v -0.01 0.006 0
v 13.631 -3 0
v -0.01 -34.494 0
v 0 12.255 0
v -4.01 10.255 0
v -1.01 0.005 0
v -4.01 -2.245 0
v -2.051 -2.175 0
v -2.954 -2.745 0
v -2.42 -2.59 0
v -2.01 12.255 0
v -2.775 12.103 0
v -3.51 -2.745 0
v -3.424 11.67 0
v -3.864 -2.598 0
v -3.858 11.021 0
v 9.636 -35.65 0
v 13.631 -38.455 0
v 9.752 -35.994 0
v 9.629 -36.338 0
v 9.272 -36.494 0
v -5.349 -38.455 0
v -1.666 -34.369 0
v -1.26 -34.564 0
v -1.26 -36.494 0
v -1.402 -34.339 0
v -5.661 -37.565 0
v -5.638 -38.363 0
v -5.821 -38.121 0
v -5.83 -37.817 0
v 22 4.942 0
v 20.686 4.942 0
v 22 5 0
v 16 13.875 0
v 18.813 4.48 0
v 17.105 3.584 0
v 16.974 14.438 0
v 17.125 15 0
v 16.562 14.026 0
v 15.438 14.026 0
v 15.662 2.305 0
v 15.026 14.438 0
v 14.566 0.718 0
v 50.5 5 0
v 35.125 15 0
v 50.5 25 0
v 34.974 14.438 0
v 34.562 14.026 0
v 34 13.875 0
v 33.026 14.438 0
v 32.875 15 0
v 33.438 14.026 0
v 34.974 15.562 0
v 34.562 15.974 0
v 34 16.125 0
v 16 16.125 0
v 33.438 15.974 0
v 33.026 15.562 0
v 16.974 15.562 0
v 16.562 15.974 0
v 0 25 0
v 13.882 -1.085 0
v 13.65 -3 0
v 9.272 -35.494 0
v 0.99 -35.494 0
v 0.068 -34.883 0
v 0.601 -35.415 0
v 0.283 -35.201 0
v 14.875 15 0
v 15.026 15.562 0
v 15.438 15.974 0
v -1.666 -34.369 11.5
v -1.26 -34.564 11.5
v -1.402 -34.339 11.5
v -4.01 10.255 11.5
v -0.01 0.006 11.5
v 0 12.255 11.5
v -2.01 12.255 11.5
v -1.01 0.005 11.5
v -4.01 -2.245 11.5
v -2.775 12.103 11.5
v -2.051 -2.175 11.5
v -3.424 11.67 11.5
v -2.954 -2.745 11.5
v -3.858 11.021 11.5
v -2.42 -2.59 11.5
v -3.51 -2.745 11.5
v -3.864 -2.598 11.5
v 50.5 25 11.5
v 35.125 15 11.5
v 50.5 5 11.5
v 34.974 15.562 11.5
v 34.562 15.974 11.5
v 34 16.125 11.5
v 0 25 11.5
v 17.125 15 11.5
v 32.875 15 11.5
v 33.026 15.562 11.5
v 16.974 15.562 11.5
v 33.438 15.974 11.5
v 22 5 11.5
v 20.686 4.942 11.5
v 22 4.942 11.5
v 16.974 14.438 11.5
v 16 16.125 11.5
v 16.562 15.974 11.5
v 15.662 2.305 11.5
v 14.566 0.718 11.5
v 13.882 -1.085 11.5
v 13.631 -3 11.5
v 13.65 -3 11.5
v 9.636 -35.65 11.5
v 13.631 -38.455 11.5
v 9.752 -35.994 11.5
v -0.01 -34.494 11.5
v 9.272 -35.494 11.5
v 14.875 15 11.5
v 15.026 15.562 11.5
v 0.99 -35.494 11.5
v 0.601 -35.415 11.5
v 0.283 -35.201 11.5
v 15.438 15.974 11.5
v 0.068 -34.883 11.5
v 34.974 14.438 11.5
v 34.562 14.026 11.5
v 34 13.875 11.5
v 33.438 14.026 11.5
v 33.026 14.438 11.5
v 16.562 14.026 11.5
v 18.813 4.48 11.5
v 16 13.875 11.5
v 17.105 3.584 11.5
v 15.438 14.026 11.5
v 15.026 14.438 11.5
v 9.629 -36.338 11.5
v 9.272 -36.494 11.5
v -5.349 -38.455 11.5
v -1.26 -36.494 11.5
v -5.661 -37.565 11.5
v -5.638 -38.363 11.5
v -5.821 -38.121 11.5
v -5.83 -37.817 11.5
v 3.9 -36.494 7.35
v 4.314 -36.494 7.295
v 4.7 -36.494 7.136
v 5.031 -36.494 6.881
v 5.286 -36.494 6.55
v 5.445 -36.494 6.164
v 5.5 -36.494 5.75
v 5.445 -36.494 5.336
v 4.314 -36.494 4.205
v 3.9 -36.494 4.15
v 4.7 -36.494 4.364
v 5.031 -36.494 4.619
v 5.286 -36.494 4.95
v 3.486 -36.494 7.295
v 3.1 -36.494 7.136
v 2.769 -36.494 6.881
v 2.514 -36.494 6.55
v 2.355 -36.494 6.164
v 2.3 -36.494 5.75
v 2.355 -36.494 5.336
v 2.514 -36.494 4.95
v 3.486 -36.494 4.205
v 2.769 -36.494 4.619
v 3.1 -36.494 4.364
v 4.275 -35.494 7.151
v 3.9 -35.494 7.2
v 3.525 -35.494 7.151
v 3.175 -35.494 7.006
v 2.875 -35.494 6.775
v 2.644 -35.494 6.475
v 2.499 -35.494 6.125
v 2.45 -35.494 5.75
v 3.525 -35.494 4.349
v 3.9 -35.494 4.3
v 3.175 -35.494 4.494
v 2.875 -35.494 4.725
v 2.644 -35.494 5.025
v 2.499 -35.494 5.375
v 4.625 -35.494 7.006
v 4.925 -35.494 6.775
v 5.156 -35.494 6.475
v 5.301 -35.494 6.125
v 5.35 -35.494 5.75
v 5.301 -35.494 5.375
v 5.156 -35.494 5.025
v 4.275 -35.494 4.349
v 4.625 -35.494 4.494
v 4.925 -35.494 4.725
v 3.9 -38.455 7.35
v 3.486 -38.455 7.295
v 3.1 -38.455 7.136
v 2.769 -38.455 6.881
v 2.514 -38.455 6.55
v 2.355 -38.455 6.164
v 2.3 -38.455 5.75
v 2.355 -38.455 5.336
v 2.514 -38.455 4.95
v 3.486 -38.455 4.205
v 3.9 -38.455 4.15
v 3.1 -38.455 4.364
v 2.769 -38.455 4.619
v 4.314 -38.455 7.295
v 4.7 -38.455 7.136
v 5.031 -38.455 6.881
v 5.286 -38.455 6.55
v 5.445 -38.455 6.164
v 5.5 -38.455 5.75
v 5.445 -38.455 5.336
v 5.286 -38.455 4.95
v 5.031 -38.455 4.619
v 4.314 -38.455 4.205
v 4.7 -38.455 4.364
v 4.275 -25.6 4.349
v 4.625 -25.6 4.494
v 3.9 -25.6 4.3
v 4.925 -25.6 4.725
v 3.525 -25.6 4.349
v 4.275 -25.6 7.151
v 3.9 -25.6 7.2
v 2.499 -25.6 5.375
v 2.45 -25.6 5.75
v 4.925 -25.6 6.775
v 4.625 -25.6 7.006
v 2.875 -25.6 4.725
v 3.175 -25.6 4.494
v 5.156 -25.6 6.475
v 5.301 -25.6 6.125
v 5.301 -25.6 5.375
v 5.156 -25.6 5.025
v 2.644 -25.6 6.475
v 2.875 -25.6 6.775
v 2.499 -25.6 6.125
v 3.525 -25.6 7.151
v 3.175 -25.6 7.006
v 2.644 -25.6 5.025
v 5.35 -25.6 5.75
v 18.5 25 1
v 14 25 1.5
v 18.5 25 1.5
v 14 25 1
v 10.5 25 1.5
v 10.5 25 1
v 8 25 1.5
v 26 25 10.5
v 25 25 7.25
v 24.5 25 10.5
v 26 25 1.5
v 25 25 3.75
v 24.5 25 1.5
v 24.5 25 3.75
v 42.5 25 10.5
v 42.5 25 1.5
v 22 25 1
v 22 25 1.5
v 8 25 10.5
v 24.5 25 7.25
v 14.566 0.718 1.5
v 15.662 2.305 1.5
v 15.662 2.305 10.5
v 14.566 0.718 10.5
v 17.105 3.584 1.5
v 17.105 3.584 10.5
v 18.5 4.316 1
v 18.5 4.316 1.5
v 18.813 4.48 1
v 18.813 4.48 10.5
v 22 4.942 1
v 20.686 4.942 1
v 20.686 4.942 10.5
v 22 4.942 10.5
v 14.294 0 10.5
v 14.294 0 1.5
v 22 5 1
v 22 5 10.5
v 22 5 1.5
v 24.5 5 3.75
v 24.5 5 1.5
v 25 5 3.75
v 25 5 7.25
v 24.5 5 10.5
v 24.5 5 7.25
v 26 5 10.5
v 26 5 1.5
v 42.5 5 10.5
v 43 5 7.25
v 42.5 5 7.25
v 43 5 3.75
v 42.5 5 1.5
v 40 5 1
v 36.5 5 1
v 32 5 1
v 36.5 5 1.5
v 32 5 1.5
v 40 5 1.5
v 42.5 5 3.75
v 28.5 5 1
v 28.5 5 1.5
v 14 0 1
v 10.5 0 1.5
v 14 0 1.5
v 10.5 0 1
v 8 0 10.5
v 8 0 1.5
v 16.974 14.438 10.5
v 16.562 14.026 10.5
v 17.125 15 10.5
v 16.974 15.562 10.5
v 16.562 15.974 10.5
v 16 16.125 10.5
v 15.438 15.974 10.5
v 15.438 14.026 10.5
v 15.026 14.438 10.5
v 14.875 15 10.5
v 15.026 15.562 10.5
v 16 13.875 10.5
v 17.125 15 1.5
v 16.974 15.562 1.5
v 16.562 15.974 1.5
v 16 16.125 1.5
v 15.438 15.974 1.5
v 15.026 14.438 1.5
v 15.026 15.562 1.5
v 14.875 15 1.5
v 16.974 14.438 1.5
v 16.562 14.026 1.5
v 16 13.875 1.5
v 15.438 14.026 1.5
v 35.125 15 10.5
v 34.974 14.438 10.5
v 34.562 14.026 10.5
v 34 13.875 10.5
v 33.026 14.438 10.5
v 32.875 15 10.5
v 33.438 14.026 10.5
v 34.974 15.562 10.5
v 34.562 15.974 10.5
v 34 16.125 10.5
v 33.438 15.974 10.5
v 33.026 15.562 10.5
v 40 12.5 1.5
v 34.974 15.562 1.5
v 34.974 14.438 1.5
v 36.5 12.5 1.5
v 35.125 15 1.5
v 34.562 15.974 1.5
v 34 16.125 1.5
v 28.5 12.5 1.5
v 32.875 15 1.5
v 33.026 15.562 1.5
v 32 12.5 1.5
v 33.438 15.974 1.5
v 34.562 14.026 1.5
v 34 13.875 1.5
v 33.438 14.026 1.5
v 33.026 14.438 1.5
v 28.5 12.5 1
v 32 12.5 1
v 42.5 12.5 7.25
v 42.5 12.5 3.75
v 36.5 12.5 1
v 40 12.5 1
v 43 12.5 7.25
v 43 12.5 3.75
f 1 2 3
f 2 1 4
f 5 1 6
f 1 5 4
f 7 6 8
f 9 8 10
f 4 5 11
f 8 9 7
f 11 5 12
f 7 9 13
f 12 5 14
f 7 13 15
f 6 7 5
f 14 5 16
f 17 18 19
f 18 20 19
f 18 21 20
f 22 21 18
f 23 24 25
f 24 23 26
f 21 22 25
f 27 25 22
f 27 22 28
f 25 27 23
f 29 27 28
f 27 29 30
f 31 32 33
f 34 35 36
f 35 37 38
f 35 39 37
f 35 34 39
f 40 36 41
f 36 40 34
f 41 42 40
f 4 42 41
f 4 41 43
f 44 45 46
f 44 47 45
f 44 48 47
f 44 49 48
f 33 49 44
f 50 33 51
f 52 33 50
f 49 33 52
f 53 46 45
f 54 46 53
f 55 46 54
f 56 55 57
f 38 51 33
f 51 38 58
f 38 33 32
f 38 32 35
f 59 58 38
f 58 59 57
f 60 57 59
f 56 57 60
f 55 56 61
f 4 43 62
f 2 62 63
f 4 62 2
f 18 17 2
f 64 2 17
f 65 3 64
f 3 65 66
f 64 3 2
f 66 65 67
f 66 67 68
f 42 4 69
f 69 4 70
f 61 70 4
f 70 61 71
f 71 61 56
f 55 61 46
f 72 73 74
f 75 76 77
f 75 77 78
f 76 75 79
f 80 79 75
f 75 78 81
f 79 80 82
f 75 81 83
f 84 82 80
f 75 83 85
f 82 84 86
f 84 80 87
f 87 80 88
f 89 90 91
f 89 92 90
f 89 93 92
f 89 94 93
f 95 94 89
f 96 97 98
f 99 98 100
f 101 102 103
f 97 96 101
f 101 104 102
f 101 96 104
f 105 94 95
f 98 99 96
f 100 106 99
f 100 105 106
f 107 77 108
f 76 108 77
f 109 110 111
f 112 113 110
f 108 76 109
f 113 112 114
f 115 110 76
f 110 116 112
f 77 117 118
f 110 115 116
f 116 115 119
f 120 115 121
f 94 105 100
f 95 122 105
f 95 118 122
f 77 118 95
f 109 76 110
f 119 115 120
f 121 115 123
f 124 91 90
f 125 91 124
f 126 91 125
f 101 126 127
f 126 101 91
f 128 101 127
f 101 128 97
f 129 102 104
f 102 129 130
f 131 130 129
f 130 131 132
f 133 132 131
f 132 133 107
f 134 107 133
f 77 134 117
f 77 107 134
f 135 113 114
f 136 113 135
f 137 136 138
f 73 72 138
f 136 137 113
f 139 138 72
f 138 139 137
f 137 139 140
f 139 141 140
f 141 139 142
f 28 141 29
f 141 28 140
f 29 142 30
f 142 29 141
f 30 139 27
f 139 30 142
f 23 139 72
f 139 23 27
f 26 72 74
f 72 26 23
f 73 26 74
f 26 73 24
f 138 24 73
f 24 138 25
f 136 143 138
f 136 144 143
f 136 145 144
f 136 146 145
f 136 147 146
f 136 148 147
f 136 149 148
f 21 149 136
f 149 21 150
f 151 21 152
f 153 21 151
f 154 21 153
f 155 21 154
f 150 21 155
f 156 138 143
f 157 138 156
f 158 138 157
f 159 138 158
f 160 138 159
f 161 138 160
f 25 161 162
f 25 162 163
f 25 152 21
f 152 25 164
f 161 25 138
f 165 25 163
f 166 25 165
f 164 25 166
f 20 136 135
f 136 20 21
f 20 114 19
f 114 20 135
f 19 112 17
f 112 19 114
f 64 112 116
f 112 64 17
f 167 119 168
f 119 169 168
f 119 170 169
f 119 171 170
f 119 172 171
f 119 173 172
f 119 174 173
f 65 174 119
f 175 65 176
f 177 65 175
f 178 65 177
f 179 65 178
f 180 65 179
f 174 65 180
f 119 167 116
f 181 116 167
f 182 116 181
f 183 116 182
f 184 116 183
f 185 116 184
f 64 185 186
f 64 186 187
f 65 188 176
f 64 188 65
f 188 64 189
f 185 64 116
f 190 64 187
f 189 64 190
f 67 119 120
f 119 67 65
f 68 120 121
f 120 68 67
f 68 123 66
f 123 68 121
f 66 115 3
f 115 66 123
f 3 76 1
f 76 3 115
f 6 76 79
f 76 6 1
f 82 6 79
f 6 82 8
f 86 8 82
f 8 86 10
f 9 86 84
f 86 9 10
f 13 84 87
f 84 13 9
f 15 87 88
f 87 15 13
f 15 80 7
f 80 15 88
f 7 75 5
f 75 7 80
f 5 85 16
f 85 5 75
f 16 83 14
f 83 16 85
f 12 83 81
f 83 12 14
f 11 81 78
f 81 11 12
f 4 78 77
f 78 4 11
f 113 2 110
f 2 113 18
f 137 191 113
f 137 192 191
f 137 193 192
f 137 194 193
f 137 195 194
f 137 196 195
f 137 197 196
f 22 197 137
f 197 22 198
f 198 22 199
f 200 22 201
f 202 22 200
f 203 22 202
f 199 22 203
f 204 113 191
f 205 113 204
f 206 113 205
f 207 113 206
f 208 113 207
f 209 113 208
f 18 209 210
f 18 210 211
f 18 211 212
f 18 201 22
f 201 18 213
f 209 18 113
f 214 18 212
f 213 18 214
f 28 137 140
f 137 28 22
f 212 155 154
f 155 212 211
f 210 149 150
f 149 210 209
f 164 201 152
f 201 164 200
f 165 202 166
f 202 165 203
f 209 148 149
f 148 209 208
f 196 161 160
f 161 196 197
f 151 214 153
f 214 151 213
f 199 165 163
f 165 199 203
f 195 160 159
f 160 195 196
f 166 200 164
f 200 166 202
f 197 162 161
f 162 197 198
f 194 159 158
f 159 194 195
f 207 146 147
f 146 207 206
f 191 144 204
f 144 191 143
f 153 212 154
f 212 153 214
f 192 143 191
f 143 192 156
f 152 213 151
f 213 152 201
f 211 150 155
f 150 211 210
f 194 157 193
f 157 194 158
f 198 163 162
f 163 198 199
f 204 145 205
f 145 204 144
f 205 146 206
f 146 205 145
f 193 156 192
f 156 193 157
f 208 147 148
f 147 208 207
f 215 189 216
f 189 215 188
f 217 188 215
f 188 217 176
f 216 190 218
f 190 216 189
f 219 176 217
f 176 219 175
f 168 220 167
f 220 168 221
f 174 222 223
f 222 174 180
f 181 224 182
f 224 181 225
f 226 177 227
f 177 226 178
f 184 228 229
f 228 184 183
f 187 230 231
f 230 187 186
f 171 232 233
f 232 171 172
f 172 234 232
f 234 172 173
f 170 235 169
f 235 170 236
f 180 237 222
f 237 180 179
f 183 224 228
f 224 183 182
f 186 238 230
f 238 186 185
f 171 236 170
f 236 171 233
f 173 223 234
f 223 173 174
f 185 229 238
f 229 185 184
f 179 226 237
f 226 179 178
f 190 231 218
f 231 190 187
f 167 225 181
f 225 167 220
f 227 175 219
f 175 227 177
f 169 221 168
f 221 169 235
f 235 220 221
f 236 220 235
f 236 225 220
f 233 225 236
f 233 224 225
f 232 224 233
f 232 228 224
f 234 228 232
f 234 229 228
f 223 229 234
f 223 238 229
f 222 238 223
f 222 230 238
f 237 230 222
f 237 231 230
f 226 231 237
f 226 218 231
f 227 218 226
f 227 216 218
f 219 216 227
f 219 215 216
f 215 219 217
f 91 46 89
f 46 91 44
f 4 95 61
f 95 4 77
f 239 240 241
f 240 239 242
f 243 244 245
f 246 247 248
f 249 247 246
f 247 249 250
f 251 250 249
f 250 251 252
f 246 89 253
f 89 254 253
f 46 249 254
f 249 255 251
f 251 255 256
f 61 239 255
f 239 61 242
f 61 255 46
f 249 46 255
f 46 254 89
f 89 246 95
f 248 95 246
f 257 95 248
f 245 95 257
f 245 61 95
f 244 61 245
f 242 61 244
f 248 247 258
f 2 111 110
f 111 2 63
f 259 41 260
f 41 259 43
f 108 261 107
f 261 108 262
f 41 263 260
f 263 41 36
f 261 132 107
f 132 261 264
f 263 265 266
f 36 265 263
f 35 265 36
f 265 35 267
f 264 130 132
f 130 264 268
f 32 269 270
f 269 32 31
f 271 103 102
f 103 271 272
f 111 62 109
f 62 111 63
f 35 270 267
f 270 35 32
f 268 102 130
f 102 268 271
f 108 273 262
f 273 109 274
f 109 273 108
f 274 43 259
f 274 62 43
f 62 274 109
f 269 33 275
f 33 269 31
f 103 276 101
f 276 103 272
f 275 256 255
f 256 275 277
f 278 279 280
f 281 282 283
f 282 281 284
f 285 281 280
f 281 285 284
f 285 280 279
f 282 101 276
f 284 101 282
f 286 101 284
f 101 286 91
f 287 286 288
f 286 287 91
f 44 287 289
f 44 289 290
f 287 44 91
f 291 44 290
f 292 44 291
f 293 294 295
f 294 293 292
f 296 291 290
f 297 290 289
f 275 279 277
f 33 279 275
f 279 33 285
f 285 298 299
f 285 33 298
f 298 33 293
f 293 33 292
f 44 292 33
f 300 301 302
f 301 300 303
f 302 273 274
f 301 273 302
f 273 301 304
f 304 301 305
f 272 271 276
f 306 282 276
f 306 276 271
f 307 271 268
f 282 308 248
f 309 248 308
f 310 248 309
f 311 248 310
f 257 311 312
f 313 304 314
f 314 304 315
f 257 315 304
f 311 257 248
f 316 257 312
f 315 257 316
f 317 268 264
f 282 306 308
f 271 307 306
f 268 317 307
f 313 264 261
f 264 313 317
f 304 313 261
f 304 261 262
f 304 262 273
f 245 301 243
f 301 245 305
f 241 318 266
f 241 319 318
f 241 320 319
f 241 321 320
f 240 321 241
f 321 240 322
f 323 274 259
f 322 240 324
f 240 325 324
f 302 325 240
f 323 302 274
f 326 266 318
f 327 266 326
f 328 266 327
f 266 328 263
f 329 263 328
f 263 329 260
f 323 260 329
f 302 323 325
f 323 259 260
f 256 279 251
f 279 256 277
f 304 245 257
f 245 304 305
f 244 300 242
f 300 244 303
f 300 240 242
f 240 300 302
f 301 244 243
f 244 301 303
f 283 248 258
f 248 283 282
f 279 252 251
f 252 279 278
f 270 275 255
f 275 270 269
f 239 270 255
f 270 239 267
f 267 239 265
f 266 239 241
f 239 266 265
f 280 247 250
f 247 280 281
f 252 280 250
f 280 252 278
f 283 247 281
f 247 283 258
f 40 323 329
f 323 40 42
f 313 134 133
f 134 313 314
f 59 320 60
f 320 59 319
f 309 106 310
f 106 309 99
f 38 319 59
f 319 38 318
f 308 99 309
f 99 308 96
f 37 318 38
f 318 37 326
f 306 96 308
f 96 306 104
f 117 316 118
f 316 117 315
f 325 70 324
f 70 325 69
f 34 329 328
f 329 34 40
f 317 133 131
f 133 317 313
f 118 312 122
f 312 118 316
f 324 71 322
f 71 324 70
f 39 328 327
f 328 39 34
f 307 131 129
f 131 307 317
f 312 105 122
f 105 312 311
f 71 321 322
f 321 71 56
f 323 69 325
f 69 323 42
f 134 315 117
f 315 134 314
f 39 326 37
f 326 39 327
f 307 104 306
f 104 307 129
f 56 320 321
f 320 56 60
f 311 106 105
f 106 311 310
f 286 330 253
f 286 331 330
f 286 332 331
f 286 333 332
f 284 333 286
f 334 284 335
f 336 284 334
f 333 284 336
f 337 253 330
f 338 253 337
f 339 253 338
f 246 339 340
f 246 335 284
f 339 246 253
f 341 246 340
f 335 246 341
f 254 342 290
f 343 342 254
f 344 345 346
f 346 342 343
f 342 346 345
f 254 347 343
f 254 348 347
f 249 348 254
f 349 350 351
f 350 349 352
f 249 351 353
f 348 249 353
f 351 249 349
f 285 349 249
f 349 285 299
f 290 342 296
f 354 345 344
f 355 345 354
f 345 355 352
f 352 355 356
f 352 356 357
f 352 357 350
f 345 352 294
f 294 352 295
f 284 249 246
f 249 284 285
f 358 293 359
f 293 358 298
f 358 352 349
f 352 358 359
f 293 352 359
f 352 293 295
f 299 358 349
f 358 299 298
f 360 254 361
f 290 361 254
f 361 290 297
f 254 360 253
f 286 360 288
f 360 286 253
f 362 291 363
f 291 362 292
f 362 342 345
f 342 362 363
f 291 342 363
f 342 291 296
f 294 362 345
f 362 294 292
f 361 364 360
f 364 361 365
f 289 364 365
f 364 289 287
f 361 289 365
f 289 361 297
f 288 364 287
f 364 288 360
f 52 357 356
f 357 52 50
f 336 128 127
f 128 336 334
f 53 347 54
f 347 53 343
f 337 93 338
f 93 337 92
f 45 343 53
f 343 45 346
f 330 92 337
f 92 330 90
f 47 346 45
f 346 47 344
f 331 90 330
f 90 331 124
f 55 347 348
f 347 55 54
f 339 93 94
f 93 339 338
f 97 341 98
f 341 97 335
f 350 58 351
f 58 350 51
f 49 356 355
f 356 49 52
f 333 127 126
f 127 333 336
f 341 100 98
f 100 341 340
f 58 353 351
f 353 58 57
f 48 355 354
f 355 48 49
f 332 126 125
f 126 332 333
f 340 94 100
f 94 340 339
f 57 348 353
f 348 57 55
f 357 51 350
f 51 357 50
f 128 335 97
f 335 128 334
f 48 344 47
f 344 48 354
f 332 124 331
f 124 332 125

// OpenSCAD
// This work is licensed under a Creative Commons Attribution-ShareAlike 3.0 Unported License.
// https://creativecommons.org/licenses/by-sa/3.0/

// DIN rail clamp thickness: at least 11 to have enough space for the PowerPoles; if thicker, provides a good place for labels
clampThickness = 11.5;
// the top of the row of PowerPoles will be this far above the DIN rail
heightAboveRail = 25;
// provides a good place for a label
spacingOutwardsFromRail = 8;
// how many pairs of PowerPoles?
pairCount = 2;
// spacing between PowerPole pairs
pairSpacing = 1.5;
// an endcap is a good place for a label
endcapWidth = 8;
// width of a single PowerPole; should be 8mm, but probably larger to compensate for your printer
powerPoleSquareSide = 8.5;
// diameter of roll pins to hold the PowerPoles in place; compensate for your printer
rollPinDiameter = 2.25;
// how deep the bolt should go into the solid part, past the spring clip
boltHoleDepth = 10;
// diameter where the bolt passes through the spring clip
looseBoltDiameter = 3.2;
// diameter where the bolt should screw into the DIN holder body
tightBoltDiameter = 2.9;

// DIN rail clamp
// adapted from Thingiverse 101024 by Robert Hunt
// made with 1mm wider opening: my rail is bigger or my printer prints too small
// Dimensions: 19.74 x 51 x clampThickness
module din_clamp() {
	$fn = 24;
	translate([10.1, -13.1, 0])
	difference() {
		linear_extrude(height=clampThickness, convexity=5) {
			// imported Robert's DXF to Inkscape, adjusted, then exported via https://github.com/martymcguire/inkscape-openscad-poly
			polygon(points=
				[[-9.731, 25.355], [5.910, 25.355], [6.675, 25.203], [7.324, 24.770], [7.758, 24.121], [7.910, 23.355], [7.910, 10.855],
				[7.764, 10.502], [7.410, 10.355], [6.854, 10.355], [6.320, 10.510], [5.951, 10.925], [4.910, 13.105], [3.910, 13.106],
				[3.910, -21.394], [3.832, -21.783], [3.617, -22.101], [3.299, -22.315], [2.910, -22.394], [-5.372, -22.394], [-5.736, -22.550],
				[-5.852, -22.894], [-5.729, -23.238], [-5.372, -23.394], [5.160, -23.394], [5.160, -21.464], [5.302, -21.239], [5.566, -21.269],
				[9.561, -24.465], [9.730, -24.717], [9.721, -25.021], [9.538, -25.263], [9.249, -25.355], [-9.731, -25.355]]
				, paths=
				[[0, 1, 2, 3, 4, 5, 6, 7, 8, 9, 10, 11, 12, 13, 14, 15, 16, 17, 18, 19, 20, 21, 22, 23, 24, 25, 26, 27, 28, 29, 30, 31, 32, 33, 0]]
			);
		}
		translate([0, -22.5, clampThickness / 2]) {
			rotate([90, 90, 0]) {
				cylinder(h= boltHoleDepth, r = looseBoltDiameter / 2);
			}
		}
		translate([0, -22.5, clampThickness / 2]) {
			rotate([-90, 90, 0]) {
				cylinder(h= boltHoleDepth, r = tightBoltDiameter / 2);
			}
		}
	}
}
// End of DIN clamp by Robert Hunt

// PowerPole code is inspired by thing:1424702 (which in turn was based on something from by J. Dunmire)
// but this version is way simplified and has little in common now
module powerPoleSingleCutout(){
	halfSide = powerPoleSquareSide / 2;
	module key(){
		translate([12.5,-1.75,-0.5]) cube([12.5,3.5,1]);
	}
	difference() {
		union() {
			cube([25,powerPoleSquareSide,powerPoleSquareSide + 0.5]);
			// proud keys
			translate([0,halfSide,0]) key();
			translate([0,powerPoleSquareSide,4]) rotate([90,0,0]) key();
		}
	}
}

module powerPoleWithExtendedKeys(){
	halfSide = powerPoleSquareSide / 2;
	module key(){
		translate([0,-1.75,-0.5]) cube([25,3.5,1]);
	}
	difference() {
		union() {
			cube([25,powerPoleSquareSide,powerPoleSquareSide + 0.5]);
			// proud keys
			translate([0,halfSide,0]) key();
			translate([0,powerPoleSquareSide,4]) rotate([90,0,0]) key();
		}
	}
}

module powerPoleLinearArray(pairs){
	for (i = [0:pairs - 1]) {
		translate([i * 16,0,0]) rotate([0, 0, -90]) powerPoleSingleCutout();
		translate([i * 16 + 8,0,0]) rotate([0, 0, -90]) powerPoleSingleCutout();
		translate([i * 16 + 8,-10,0]) cylinder(d=rollPinDiameter,h=30, center=true, $fn=12);
	}
}

module clampWithWing(heightAboveRailTop, height, stickOut) {
	radius = 8;
	wingBottom = heightAboveRailTop - height;
	wallThickness = 1.5; // or max(1, (clampThickness - 8.5) / 2) to center it
	difference() {
		union() {
			translate([0, wingBottom - radius, 0])
				cube([stickOut, height + radius, clampThickness]);
			translate([14, 0, 0])
				mirror([1, 0, 0])
					din_clamp();
		}
		// hollow out most of the clamp:
		//~ translate([6, 6, wallThickness])
			//~ cube([20, wingBottom - 6, 8.5]);

		translate([8, 32, wallThickness])
			cube([20, 8, 8.5]);

		translate([21.65, wingBottom - radius, -1])
			cylinder(r=radius, h=20);
		translate([22, wingBottom - radius - 1, -1])
			cube([200, radius + 1, 20]);
	}
}

// not practical to print because of trouble bridging that far
module powerpolesAllTogether() {
	perPairOffset = 16.5;
	wallThickness = 1.5;
	difference() {
		clampWithWing(heightAboveRail, 18, spacingOutwardsFromRail + perPairOffset * pairCount + endcapWidth - pairSpacing);
		translate([spacingOutwardsFromRail, heightAboveRail, wallThickness])
			powerPoleLinearArray(pairCount);
	}
}

module powerpoles2and4Together() {
	perPairOffset = pairSpacing + 16.5;
	wallThickness = 1.5;
	difference() {
		clampWithWing(heightAboveRail, 18, spacingOutwardsFromRail + 48 + pairSpacing + endcapWidth);
		// first pair of PowerPoles must insert from top
		translate([spacingOutwardsFromRail, heightAboveRail, wallThickness]) {
			translate([0,0,0]) rotate([0, 0, -90]) powerPoleWithExtendedKeys();
			translate([8,0,0]) rotate([0, 0, -90]) powerPoleWithExtendedKeys();
			translate([8,-10,0]) cylinder(d=rollPinDiameter,h=30, center=true, $fn=12);
		}
		translate([spacingOutwardsFromRail + perPairOffset, heightAboveRail, wallThickness])
			powerPoleLinearArray(2);
	}
}

module clampWithNPowerPoles() {
	perPairOffset = pairSpacing + 16.5;
	wallThickness = 1.5;
	difference() {
		clampWithWing(heightAboveRail, 20, spacingOutwardsFromRail + perPairOffset * pairCount + endcapWidth - pairSpacing);
		// first pair of PowerPoles must insert from top
		translate([spacingOutwardsFromRail, heightAboveRail, wallThickness]) {
			translate([0,0,0]) rotate([0, 0, -90]) powerPoleWithExtendedKeys();
			translate([8,0,0]) rotate([0, 0, -90]) powerPoleWithExtendedKeys();
			translate([8,-10,0]) cylinder(d=rollPinDiameter,h=30, center=true, $fn=12);
		}
		for (i = [0:pairCount - 1])
			translate([spacingOutwardsFromRail + i * perPairOffset, heightAboveRail, wallThickness])
				powerPoleLinearArray(1);
	}
}

clampWithNPowerPoles();
